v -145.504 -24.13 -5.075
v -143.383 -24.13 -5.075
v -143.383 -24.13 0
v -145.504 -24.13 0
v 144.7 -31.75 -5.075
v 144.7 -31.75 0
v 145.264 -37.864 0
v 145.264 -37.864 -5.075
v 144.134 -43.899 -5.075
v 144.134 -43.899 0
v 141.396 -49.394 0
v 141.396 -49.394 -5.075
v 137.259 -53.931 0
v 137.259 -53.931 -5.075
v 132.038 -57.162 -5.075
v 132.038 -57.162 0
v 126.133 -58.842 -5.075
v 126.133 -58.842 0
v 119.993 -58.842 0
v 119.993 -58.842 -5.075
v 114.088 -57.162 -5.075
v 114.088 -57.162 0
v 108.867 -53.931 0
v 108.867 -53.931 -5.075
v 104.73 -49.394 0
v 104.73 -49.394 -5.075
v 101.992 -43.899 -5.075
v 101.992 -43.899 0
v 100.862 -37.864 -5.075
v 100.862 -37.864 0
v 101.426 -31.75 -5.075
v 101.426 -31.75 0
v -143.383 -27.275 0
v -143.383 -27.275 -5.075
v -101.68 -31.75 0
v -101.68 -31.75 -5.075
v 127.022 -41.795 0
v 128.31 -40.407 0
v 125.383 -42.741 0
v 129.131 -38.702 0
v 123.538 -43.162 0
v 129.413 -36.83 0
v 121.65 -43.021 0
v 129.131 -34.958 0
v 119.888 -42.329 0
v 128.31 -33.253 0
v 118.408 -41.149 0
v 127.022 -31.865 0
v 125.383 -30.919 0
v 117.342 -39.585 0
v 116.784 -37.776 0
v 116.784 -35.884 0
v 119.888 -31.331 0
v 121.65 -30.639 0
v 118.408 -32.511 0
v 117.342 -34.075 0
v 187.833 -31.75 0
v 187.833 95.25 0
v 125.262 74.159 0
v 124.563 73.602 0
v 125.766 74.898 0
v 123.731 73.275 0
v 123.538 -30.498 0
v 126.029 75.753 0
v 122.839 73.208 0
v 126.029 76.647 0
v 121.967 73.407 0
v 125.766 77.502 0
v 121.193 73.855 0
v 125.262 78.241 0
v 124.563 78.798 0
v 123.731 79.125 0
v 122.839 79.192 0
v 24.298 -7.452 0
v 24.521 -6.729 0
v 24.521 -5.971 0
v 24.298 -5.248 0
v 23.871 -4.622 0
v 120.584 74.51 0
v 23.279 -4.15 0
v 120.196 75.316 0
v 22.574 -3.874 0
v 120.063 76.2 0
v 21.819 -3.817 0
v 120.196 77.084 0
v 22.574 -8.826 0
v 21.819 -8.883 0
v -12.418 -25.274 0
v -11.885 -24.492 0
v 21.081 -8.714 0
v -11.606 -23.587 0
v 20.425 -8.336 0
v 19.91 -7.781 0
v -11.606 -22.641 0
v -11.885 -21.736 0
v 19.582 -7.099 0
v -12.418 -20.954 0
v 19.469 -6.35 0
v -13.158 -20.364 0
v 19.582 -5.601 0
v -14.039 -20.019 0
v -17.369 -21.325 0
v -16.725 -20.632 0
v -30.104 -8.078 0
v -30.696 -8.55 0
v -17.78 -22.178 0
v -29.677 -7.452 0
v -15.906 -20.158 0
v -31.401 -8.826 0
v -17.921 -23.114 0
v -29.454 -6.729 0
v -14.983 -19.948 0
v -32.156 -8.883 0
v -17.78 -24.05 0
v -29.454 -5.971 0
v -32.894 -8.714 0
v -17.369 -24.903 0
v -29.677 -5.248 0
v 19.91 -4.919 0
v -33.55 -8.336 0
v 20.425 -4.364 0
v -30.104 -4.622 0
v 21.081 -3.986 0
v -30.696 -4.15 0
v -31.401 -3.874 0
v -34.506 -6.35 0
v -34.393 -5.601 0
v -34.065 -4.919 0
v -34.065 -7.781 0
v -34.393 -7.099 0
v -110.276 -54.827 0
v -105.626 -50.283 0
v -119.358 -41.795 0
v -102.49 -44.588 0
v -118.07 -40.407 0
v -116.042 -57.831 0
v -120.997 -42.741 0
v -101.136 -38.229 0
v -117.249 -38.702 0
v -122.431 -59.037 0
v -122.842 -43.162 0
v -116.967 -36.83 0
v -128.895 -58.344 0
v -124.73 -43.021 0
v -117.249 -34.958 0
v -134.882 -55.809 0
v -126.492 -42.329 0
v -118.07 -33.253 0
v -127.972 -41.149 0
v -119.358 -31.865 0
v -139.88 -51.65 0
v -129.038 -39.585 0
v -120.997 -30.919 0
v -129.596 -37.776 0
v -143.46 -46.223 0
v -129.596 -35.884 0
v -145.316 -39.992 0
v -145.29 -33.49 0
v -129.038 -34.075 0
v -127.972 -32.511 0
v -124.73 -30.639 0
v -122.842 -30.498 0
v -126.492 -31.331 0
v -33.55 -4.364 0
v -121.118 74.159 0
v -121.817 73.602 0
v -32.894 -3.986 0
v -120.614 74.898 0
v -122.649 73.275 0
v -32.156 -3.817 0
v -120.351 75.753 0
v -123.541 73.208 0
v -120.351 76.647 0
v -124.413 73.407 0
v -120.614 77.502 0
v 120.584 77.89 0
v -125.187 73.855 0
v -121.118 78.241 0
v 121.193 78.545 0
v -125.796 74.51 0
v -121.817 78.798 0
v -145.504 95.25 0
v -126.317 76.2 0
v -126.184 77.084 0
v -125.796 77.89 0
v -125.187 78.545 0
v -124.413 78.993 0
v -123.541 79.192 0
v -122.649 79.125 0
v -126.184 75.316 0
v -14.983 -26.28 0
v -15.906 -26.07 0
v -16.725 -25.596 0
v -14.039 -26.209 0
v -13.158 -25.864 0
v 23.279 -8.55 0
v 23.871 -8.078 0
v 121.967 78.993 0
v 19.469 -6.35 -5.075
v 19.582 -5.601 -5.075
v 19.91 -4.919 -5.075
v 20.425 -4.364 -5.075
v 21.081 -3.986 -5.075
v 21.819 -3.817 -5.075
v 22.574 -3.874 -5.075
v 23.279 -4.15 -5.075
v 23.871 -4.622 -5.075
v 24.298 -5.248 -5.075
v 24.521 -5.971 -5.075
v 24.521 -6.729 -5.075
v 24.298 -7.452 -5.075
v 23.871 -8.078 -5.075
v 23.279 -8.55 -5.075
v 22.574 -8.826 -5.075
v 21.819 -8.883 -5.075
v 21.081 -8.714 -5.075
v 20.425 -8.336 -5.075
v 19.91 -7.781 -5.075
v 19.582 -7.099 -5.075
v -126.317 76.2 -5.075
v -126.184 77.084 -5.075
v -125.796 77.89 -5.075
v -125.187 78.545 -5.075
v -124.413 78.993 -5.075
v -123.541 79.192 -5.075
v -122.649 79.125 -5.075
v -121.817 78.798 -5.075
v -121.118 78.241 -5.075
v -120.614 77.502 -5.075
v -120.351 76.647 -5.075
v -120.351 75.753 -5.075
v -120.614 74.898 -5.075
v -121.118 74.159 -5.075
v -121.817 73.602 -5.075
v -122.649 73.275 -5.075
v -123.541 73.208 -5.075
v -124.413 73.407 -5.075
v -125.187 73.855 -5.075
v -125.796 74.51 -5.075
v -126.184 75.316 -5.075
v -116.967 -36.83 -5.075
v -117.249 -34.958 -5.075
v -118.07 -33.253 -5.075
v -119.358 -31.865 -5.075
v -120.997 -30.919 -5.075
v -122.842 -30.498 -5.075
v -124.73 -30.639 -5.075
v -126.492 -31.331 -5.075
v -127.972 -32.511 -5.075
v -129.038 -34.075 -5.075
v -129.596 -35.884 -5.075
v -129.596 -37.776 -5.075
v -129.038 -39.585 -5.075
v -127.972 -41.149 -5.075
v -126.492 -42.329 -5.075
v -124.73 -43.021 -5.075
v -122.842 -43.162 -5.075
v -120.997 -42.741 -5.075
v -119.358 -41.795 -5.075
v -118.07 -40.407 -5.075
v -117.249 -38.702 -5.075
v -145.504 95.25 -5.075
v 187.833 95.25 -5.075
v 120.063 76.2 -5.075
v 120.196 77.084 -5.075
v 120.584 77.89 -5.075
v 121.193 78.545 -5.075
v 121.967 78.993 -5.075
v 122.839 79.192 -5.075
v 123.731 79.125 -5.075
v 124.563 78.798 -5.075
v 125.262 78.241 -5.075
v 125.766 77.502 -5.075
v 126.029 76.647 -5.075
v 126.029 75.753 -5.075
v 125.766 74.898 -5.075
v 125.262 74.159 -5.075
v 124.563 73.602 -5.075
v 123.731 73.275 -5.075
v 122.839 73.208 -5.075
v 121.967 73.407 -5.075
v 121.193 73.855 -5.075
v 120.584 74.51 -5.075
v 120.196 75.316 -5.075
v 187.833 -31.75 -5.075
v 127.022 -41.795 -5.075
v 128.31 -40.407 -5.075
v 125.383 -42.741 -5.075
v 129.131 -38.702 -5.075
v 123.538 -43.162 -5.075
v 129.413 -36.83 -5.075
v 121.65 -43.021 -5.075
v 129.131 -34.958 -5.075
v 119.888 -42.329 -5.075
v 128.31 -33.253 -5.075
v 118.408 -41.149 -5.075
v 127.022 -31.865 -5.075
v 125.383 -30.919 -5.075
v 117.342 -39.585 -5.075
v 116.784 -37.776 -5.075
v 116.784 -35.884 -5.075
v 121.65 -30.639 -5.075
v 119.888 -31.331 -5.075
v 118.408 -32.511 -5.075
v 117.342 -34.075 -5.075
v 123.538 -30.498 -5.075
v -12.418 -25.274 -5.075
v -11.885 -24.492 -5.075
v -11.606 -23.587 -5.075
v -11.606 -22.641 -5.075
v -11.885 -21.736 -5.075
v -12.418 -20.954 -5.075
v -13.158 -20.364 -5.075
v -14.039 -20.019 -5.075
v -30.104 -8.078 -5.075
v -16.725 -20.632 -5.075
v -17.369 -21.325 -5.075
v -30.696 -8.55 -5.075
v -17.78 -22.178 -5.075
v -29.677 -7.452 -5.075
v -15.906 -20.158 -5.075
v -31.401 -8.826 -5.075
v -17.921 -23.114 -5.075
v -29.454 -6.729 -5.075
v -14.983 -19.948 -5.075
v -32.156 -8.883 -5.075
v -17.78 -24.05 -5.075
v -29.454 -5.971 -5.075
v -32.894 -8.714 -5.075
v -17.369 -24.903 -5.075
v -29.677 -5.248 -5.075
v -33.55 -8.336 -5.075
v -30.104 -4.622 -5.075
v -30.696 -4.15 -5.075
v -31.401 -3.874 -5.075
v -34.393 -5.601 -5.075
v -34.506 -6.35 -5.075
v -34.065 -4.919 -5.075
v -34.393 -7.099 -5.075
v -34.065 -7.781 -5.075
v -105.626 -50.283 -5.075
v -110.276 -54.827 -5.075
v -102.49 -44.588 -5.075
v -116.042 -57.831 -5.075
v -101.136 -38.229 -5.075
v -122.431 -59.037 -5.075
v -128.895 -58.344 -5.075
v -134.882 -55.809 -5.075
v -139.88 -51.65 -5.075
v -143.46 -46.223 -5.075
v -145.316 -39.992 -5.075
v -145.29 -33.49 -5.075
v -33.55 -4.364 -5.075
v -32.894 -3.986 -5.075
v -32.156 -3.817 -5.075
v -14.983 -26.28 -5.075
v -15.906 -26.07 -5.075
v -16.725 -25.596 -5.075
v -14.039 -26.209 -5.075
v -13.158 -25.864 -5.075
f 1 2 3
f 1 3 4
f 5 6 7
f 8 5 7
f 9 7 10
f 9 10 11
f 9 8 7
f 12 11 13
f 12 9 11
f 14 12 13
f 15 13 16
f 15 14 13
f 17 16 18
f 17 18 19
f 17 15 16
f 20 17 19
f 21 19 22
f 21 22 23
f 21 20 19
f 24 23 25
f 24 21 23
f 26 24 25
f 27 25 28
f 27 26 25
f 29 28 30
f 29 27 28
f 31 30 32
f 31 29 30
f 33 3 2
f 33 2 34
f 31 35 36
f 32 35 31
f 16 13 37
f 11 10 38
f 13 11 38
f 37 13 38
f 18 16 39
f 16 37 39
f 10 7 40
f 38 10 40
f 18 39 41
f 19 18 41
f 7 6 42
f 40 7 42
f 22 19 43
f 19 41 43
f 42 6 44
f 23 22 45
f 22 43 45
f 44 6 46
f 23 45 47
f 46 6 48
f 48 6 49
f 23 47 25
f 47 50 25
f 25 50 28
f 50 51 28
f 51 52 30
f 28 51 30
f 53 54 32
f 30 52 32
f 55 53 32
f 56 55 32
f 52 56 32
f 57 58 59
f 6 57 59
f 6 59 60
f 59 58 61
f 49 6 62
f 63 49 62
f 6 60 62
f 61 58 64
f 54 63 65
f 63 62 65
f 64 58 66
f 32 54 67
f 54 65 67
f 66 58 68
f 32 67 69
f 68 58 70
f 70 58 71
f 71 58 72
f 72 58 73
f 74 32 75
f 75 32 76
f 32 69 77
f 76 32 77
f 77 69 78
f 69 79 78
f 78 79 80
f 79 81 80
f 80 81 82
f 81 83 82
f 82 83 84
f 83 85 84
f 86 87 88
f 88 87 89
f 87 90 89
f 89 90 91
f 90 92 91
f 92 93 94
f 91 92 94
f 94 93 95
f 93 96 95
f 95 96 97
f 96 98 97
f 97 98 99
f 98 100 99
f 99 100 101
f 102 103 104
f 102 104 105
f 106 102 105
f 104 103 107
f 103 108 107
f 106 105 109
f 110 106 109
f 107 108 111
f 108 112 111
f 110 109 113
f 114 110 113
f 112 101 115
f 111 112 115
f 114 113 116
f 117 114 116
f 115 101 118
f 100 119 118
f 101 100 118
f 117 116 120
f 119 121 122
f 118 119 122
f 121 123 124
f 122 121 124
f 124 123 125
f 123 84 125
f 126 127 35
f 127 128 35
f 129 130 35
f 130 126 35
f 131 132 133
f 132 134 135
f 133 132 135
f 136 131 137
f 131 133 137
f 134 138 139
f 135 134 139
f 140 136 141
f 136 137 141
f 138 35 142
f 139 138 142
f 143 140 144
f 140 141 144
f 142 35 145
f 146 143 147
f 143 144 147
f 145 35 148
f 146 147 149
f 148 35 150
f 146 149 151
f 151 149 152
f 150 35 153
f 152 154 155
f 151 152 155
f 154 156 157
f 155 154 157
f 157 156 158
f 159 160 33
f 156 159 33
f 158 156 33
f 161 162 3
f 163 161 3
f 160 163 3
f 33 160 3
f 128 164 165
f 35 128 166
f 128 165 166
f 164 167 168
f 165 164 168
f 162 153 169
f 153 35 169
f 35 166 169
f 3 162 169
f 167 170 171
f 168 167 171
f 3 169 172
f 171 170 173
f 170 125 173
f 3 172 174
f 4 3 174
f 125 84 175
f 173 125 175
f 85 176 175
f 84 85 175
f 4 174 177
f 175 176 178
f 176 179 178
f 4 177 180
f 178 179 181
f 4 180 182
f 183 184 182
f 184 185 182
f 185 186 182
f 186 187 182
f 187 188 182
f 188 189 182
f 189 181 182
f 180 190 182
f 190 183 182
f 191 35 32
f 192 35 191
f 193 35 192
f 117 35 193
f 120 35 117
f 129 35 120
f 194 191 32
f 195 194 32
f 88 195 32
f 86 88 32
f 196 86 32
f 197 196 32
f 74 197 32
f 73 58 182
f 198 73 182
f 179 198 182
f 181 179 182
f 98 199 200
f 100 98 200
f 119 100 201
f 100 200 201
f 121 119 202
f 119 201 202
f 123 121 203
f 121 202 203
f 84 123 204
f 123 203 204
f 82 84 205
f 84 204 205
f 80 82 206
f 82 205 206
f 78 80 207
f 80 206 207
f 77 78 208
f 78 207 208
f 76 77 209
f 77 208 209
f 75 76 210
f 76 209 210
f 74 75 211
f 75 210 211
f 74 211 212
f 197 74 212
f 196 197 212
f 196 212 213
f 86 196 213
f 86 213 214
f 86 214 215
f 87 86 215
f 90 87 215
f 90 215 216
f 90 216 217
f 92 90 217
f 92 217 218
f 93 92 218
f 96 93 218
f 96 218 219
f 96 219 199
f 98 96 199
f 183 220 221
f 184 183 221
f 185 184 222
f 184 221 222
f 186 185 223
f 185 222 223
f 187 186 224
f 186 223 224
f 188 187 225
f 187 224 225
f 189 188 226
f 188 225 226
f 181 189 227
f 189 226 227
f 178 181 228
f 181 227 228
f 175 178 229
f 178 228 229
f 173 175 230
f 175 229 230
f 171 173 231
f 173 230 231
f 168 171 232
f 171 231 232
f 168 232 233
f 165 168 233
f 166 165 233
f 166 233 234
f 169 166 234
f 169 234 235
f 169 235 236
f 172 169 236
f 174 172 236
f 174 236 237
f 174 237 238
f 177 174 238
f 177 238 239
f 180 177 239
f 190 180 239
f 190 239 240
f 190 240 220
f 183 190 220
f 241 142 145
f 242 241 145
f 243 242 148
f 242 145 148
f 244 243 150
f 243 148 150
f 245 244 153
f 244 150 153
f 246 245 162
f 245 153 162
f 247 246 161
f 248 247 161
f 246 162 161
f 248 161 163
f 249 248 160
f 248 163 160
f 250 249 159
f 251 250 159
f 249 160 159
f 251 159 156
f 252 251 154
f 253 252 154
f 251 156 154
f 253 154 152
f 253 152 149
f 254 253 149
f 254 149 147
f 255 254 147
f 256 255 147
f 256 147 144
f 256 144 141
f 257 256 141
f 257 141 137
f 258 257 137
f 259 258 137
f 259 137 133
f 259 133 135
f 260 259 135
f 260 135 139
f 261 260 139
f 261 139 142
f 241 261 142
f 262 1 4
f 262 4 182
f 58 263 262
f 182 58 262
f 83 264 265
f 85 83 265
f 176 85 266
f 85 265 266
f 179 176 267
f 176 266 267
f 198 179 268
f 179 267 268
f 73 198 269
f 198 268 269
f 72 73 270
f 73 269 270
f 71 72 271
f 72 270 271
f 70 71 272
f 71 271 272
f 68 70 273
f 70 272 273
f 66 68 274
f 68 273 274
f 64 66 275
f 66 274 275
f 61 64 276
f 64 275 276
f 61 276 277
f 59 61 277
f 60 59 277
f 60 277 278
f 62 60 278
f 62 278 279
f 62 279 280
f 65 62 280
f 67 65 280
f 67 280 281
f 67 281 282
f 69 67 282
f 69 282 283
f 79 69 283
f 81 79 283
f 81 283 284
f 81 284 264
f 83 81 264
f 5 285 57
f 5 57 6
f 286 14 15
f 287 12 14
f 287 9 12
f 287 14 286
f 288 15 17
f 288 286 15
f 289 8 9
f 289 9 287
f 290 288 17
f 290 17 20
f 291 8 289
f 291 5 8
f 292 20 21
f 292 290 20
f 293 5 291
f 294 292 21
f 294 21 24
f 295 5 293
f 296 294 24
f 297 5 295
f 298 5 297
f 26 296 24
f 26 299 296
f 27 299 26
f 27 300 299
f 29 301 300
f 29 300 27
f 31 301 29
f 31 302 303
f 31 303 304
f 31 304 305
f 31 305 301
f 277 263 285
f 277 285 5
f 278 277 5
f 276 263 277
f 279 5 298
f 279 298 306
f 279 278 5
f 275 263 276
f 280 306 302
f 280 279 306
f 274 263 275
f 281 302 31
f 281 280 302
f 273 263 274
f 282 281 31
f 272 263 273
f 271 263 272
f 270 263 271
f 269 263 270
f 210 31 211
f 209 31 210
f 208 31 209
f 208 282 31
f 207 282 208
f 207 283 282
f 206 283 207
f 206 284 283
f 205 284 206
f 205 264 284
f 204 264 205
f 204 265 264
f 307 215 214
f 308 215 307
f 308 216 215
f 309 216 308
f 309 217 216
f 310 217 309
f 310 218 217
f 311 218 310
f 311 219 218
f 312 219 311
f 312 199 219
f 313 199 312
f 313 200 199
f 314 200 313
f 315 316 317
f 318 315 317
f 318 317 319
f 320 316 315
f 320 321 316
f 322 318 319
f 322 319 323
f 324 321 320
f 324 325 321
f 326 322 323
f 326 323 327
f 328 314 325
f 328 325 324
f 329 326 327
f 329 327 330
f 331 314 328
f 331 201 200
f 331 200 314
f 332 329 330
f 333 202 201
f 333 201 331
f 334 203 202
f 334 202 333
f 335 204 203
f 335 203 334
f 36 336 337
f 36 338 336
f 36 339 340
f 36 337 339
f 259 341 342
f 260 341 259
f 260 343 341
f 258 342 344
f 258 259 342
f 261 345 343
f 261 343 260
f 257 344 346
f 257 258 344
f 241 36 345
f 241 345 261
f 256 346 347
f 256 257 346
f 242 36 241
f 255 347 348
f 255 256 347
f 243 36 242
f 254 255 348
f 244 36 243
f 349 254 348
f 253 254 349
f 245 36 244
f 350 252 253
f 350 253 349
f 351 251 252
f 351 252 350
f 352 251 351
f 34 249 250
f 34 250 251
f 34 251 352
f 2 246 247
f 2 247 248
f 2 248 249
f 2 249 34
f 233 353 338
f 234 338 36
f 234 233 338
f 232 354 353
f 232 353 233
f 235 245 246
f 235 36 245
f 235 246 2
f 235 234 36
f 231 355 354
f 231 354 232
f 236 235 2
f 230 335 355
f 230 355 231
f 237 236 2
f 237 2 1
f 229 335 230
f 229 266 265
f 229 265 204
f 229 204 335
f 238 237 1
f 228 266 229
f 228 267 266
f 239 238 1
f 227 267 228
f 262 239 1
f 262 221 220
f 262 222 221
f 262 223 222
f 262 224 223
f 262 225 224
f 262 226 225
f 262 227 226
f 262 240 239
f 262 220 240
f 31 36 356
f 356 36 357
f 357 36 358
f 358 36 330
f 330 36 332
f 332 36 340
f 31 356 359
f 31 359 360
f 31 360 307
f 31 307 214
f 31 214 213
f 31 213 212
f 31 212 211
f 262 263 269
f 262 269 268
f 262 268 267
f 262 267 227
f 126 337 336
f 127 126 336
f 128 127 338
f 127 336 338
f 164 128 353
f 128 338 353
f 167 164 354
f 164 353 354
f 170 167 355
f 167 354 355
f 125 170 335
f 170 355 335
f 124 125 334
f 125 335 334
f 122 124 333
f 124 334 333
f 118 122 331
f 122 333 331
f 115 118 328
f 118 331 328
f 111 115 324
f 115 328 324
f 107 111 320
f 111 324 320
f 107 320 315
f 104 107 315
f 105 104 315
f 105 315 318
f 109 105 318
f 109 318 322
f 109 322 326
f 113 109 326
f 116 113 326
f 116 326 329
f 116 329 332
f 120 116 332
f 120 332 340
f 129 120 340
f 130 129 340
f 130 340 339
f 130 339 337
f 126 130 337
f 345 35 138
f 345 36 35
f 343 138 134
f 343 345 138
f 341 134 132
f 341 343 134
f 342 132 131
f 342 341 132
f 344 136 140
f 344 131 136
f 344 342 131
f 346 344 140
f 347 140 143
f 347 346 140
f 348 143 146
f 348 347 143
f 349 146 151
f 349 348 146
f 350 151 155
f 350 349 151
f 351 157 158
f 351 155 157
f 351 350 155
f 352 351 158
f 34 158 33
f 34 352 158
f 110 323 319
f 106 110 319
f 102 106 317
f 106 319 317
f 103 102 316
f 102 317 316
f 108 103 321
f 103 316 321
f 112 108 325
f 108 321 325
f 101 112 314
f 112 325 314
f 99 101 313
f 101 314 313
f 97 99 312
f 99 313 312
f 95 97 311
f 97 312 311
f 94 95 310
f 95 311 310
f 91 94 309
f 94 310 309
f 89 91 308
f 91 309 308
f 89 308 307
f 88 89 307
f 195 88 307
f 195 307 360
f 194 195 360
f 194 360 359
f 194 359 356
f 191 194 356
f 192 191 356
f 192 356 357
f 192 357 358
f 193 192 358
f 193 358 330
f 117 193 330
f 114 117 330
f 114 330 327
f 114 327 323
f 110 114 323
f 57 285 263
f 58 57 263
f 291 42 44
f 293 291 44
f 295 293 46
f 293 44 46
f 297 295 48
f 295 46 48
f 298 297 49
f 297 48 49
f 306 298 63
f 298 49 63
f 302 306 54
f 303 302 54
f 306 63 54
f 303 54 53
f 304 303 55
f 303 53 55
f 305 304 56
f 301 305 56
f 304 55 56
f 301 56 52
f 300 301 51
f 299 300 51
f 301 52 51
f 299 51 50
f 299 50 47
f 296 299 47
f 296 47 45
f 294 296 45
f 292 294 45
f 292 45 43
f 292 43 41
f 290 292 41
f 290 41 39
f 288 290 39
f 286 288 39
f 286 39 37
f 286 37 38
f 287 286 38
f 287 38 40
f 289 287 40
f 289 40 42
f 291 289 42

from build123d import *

# Parameters (mm, degrees)
BOSS_EXTRUDE1_DEPTH = 5.07492
SKETCH5_W           = 44.45
SKETCH5_H           = 127
BOSS_EXTRUDE2_DEPTH = 5.07492
SKETCH6_R           = 22.225
BOSS_EXTRUDE3_DEPTH = 5.07492
SKETCH2_3_R         = 6.35
CUT_EXTRUDE2_DEPTH  = 5.588
SKETCH8_W           = 2.728150378
SKETCH8_H           = 119.38
BOSS_EXTRUDE4_DEPTH = 5.07492
SKETCH9_R           = 3
CUT_EXTRUDE3_DEPTH  = 400.05
SKETCH10_R          = 2.54
SKETCH10_R_2        = 3.175
CUT_EXTRUDE4_DEPTH  = 6.35


with BuildPart() as part:
    # Sketch2 → Boss-Extrude1 (new body)
    with BuildSketch(Plane.XY):
        with BuildLine():
            Line((-143.383, -31.75), (-127.127, -31.75))
            ThreePointArc((-127.127, -31.75), (-123.317, -30.48), (-119.507, -31.75))
            Line((-119.507, -31.75), (119.253, -31.75))
            ThreePointArc((119.253, -31.75), (123.063, -30.48), (126.873, -31.75))
            Line((126.873, -31.75), (143.383, -31.75))
            Line((143.383, -31.75), (143.383, 95.25))
            Line((143.383, 95.25), (-143.383, 95.25))
            Line((-143.383, 95.25), (-143.383, -31.75))
        make_face()
    extrude(amount=-BOSS_EXTRUDE1_DEPTH)

    # Sketch5 → Boss-Extrude2 (add)
    with BuildSketch(Plane(origin=(0, 0, -5.07492), x_dir=(-1, 0, 0), z_dir=(0, 0, -1))):
        with Locations((-165.608, 31.75)):
            Rectangle(SKETCH5_W, SKETCH5_H)
    extrude(amount=-BOSS_EXTRUDE2_DEPTH)

    # Sketch6 → Boss-Extrude3 (add)
    with BuildSketch(Plane(origin=(0, 0, -5.07492), x_dir=(-1, 0, 0), z_dir=(0, 0, -1))):
        with Locations((-123.063, -36.83)):
            Circle(SKETCH6_R)
        with Locations((123.317, -36.83)):
            Circle(SKETCH6_R)
    extrude(amount=-BOSS_EXTRUDE3_DEPTH)

    # Sketch2<3> → Cut-Extrude2 (cut)
    with BuildSketch(Plane.XY):
        with Locations((-123.317, -36.83)):
            Circle(SKETCH2_3_R)
        with Locations((123.063, -36.83)):
            Circle(SKETCH2_3_R)
    extrude(amount=-CUT_EXTRUDE2_DEPTH, mode=Mode.SUBTRACT)

    # Sketch8 → Boss-Extrude4 (add)
    with BuildSketch(Plane(origin=(0, 0, -5.07492), x_dir=(-1, 0, 0), z_dir=(0, 0, -1))):
        with Locations((144.139824811, 35.56)):
            Rectangle(SKETCH8_W, SKETCH8_H)
    extrude(amount=-BOSS_EXTRUDE4_DEPTH)

    # Sketch9 → Cut-Extrude3 (cut)
    with BuildSketch(Plane(origin=(0, 0, -5.07492), x_dir=(-1, 0, 0), z_dir=(0, 0, -1))):
        with Locations((-123.063, 76.2)):
            Circle(SKETCH9_R)
        with Locations((123.317, 76.2)):
            Circle(SKETCH9_R)
    extrude(amount=-CUT_EXTRUDE3_DEPTH, mode=Mode.SUBTRACT)

    # Sketch10 → Cut-Extrude4 (cut)
    with BuildSketch(Plane(origin=(0, 0, -5.07492), x_dir=(-1, 0, 0), z_dir=(0, 0, -1))):
        with Locations((-22.0091, -6.35)):
            Circle(SKETCH10_R)
        with Locations((31.9659, -6.35)):
            Circle(SKETCH10_R)
        with Locations((14.745829779, -23.114)):
            Circle(SKETCH10_R_2)
    extrude(amount=-CUT_EXTRUDE4_DEPTH, mode=Mode.SUBTRACT)


solid = part.part
